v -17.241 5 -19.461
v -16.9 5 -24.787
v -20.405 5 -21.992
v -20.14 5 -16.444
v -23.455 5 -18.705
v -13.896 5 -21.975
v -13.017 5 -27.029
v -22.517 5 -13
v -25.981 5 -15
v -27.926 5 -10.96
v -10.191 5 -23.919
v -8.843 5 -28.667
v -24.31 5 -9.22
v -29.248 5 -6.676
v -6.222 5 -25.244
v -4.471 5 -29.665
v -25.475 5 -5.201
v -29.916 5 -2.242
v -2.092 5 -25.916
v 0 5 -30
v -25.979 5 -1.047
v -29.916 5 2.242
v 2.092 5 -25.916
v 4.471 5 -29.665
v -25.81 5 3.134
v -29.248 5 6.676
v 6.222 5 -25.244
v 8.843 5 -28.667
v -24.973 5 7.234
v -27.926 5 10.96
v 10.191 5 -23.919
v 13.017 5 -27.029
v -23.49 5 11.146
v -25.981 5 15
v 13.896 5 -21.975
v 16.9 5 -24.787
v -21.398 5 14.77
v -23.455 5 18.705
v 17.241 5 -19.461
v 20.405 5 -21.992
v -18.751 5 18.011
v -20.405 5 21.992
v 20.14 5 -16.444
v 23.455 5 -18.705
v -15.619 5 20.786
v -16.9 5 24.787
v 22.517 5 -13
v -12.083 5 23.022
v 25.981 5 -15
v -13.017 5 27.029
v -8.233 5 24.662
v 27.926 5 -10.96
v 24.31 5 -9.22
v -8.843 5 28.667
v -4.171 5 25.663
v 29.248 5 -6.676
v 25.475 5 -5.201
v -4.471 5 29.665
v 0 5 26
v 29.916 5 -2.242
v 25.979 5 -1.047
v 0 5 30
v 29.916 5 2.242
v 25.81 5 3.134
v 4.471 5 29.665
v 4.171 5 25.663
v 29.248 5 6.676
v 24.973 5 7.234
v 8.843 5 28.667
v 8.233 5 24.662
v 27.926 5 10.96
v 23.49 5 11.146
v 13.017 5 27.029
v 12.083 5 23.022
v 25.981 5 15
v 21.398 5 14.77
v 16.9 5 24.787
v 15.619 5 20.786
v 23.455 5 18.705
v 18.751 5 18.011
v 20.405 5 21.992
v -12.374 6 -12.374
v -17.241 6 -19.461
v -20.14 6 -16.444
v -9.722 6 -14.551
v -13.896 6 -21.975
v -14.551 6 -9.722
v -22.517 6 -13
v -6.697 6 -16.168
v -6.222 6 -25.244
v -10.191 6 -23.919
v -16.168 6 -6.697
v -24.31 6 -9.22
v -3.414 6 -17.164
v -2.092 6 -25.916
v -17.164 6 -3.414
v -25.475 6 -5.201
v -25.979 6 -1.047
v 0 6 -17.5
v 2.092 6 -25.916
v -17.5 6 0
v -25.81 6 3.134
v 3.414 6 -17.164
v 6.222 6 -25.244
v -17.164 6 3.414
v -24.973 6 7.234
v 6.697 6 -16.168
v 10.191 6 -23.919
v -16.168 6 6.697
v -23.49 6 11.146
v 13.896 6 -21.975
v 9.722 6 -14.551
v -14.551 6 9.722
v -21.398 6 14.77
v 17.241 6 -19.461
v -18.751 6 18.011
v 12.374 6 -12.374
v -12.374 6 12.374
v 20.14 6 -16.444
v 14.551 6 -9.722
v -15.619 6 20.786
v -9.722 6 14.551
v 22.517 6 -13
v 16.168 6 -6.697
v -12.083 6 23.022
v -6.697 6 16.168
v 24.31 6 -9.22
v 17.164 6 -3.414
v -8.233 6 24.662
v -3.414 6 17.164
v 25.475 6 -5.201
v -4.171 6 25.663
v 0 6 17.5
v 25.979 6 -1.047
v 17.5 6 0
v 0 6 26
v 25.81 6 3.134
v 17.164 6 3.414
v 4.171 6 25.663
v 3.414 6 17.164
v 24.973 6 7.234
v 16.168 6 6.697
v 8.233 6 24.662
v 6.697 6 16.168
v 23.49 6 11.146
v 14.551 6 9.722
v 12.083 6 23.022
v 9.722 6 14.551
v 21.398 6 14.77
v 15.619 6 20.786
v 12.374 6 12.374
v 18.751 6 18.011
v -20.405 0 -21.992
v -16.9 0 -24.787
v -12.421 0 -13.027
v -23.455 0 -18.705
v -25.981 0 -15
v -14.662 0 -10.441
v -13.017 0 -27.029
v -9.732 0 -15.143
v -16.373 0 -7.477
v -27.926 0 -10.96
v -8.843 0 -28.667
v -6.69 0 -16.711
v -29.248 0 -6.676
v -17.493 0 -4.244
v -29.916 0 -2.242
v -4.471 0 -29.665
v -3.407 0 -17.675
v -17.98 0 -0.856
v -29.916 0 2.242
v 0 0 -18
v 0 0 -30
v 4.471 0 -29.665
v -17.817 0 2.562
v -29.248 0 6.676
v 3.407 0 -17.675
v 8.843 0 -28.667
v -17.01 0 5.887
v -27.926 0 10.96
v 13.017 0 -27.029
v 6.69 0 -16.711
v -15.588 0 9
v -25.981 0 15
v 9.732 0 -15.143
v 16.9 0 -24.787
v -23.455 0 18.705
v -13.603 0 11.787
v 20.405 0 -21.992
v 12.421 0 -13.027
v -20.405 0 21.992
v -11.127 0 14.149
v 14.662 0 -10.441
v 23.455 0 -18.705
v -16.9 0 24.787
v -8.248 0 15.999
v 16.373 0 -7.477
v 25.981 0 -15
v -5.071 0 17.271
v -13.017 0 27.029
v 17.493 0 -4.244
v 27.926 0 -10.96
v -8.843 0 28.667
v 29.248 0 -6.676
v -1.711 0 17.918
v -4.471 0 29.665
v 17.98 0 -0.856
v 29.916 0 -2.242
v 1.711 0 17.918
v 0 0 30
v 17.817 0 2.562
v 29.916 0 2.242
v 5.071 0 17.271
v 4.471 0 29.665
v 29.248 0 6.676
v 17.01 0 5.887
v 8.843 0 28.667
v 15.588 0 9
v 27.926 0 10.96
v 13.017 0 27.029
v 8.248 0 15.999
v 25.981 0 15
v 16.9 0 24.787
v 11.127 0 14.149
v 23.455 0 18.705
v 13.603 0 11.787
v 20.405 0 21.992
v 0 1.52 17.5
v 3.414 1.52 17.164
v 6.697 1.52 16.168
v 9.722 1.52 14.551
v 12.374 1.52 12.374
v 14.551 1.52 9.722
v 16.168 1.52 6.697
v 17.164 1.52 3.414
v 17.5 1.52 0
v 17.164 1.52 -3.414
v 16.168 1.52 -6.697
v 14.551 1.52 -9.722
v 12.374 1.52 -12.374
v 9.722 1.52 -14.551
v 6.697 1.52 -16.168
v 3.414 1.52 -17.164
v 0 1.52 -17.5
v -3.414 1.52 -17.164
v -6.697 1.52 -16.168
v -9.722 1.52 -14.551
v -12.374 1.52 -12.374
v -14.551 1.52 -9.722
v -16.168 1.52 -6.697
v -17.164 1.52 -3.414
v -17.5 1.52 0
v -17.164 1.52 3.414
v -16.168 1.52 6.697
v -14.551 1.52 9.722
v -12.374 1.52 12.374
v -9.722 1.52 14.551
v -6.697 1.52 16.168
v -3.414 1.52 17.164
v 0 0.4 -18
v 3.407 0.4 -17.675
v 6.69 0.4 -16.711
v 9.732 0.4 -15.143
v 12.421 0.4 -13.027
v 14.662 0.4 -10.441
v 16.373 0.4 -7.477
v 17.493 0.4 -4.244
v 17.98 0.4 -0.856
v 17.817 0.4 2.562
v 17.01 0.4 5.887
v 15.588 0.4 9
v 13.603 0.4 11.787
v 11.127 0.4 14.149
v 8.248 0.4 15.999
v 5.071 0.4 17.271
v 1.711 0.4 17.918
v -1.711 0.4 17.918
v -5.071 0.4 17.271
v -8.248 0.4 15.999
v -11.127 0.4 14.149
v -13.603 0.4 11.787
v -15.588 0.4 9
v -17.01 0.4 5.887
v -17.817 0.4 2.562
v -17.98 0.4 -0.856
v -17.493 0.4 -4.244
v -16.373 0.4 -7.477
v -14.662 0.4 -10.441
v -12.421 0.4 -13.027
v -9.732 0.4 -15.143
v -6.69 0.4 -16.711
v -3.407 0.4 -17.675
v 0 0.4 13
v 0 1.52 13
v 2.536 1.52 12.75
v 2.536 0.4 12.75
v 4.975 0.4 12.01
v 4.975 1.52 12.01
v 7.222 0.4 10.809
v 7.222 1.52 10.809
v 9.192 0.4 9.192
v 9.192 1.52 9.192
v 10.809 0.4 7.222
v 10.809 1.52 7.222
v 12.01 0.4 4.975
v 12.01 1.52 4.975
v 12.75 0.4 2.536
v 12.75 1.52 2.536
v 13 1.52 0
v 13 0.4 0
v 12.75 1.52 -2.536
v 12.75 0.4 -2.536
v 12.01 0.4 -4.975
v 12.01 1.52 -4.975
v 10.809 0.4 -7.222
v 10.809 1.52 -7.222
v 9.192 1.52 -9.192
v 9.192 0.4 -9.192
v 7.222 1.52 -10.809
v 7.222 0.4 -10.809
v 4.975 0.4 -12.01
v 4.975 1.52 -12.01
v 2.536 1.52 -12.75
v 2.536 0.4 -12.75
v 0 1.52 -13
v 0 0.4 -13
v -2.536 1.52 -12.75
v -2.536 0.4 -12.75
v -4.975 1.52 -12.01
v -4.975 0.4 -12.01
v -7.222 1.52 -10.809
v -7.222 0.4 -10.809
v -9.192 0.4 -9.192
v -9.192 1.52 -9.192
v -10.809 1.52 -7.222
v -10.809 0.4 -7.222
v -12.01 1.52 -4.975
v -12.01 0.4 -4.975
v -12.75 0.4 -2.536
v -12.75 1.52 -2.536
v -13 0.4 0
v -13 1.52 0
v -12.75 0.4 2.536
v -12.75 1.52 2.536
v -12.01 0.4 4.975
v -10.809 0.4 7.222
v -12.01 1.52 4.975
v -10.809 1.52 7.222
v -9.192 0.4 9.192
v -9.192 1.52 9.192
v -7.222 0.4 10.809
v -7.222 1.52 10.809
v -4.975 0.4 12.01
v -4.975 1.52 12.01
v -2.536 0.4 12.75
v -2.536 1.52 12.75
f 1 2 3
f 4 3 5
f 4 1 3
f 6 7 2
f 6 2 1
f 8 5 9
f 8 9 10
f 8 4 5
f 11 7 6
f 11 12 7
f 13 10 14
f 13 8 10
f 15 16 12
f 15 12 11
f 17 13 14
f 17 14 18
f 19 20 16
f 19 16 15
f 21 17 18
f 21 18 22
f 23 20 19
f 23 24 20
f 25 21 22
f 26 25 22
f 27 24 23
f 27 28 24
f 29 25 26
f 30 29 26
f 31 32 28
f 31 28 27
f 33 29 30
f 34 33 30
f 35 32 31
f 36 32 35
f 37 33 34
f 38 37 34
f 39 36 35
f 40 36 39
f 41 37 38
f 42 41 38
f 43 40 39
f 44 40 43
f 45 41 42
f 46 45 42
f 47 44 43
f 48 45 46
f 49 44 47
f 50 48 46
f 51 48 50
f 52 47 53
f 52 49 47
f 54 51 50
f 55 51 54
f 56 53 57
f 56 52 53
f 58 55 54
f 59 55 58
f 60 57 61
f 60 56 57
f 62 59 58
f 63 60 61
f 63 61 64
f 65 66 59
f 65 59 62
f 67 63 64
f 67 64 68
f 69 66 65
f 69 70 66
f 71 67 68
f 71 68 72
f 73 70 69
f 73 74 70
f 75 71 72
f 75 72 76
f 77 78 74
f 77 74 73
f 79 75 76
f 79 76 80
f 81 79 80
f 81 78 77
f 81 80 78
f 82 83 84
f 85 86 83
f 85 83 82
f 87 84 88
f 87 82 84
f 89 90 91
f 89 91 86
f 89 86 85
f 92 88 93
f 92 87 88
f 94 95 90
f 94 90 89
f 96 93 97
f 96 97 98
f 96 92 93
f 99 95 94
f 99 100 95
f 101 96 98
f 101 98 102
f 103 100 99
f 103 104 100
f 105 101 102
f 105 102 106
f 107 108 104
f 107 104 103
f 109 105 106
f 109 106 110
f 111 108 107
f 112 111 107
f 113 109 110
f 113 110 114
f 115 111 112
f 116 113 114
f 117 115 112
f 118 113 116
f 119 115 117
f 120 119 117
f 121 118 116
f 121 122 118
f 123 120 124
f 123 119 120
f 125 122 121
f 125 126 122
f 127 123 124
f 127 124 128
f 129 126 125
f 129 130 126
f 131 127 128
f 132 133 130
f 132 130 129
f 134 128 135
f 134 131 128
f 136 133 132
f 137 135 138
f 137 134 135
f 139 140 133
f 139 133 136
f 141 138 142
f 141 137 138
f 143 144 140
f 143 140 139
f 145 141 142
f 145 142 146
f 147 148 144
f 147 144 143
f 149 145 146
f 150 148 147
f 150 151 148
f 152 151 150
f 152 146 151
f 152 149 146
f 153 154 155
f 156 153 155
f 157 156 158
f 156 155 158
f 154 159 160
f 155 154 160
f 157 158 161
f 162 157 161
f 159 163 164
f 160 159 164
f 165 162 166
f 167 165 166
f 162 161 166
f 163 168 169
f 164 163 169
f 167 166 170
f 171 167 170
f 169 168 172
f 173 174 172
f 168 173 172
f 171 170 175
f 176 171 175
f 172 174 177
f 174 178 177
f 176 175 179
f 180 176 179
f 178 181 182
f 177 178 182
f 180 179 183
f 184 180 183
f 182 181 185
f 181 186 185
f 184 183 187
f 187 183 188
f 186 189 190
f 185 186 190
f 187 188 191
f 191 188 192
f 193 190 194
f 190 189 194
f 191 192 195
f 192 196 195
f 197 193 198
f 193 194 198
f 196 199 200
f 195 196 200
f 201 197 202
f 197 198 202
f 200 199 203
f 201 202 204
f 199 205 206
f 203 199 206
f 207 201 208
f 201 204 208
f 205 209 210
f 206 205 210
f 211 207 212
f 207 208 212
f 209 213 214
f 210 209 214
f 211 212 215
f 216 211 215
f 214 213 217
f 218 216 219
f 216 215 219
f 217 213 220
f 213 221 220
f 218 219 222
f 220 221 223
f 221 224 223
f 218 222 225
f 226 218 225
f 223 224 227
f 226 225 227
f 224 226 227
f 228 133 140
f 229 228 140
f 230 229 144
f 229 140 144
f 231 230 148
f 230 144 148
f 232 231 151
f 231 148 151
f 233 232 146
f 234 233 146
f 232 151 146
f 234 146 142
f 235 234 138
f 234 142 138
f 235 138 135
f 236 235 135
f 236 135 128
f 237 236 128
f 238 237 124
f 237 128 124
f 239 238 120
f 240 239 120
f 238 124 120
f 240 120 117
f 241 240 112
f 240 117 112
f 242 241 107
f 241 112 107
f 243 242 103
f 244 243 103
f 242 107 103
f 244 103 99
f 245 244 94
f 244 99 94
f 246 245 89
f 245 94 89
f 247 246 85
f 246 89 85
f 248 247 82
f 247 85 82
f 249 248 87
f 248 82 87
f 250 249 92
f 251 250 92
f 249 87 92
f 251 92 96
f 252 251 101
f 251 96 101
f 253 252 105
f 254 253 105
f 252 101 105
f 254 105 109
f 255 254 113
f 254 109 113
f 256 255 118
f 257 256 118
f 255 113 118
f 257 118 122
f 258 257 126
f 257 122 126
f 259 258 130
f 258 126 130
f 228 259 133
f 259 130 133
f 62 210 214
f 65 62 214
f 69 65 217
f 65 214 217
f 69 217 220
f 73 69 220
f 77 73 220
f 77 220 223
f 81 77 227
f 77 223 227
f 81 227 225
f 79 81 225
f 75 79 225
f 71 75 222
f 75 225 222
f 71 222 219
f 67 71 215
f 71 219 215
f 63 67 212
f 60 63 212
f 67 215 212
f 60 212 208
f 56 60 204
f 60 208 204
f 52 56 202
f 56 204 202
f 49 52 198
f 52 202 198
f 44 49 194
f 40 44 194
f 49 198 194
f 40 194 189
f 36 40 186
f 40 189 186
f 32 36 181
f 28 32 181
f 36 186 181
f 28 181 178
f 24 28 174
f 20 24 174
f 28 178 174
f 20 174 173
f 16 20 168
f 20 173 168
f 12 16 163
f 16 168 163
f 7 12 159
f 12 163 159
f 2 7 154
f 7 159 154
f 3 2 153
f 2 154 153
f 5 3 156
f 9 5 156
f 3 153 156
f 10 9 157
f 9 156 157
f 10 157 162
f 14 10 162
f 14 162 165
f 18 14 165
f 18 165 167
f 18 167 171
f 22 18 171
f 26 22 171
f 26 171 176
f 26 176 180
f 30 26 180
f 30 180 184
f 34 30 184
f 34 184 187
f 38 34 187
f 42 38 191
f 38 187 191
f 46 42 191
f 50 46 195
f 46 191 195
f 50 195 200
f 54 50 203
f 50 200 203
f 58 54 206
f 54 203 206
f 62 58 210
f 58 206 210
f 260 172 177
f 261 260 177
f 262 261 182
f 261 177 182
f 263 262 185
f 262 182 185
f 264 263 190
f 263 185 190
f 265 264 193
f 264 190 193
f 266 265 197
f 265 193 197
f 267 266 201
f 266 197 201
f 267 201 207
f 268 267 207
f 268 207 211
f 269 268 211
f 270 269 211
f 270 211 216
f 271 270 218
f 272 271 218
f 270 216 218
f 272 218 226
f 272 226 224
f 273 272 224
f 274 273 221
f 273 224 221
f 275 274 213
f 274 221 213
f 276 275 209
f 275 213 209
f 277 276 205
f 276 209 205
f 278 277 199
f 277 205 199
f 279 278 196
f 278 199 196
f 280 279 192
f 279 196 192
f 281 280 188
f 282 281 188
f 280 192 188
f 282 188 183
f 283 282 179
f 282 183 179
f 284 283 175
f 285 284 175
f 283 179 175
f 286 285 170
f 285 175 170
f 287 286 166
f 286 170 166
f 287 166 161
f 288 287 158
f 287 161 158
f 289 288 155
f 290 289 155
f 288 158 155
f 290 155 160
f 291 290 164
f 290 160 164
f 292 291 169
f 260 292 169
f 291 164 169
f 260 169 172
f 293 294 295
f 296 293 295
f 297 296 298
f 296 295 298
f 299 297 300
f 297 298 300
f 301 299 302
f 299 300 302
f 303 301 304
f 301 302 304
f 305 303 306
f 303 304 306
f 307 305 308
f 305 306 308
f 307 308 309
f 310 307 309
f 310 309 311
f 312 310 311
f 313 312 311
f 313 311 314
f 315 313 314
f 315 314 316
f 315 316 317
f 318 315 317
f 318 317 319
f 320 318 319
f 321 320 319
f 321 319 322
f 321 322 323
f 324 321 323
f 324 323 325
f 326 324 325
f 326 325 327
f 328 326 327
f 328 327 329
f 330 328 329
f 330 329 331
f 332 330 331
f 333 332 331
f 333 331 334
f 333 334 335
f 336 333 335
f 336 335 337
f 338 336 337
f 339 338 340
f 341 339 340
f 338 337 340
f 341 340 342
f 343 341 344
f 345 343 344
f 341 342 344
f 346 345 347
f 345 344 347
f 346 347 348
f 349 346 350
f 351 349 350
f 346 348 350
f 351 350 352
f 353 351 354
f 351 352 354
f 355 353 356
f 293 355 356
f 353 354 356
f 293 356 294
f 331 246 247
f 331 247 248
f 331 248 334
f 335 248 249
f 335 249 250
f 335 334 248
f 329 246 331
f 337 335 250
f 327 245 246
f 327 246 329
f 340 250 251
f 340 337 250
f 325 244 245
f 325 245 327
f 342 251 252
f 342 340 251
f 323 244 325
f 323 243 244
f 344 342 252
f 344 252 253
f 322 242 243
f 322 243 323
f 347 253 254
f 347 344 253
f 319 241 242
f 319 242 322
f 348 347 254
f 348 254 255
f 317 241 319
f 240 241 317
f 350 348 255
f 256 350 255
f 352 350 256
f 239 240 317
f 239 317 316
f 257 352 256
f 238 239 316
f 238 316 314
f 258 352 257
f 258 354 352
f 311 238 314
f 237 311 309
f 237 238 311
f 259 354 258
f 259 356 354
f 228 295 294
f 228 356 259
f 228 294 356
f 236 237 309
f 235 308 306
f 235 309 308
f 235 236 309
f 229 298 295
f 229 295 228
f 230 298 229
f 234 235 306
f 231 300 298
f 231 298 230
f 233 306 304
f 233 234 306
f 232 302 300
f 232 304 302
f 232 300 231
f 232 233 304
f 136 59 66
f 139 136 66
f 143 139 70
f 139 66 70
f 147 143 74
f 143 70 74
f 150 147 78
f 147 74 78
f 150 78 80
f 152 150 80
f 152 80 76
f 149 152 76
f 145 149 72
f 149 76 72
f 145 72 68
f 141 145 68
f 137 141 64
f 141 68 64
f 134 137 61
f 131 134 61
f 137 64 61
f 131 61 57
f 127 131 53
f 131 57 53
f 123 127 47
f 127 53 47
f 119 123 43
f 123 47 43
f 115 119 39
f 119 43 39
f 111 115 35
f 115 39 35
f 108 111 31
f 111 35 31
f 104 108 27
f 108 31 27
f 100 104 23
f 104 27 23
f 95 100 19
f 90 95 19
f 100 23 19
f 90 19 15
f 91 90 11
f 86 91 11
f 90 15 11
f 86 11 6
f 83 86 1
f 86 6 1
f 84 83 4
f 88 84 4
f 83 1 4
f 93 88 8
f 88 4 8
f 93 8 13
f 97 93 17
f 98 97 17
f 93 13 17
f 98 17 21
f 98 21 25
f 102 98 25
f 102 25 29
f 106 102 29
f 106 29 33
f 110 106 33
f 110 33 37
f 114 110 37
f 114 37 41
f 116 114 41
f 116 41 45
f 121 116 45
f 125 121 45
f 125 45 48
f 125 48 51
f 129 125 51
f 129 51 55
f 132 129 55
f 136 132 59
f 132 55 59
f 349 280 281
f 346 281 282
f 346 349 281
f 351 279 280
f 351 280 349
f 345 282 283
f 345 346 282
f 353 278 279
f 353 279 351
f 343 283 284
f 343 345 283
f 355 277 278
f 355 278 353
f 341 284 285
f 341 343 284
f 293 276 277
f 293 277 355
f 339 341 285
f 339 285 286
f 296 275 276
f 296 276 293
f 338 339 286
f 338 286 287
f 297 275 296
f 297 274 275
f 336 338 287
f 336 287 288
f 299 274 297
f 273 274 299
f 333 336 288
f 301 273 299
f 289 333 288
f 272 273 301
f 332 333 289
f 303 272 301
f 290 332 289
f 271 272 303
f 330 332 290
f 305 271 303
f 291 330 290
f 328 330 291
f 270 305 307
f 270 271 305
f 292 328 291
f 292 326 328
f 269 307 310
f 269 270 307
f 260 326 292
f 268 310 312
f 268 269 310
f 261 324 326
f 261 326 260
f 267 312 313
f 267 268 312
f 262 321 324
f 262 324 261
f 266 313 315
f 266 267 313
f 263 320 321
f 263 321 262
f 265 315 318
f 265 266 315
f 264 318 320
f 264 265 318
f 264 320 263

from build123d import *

# Parameters (mm, degrees)
SKETCH_1_R          = 30
EXTRUDE_1_DEPTH     = 5
SKETCH_2_R          = 26
EXTRUDE_2_DEPTH     = 1
SKETCH_3_R          = 18
CUT_EXTRUDE_1_DEPTH = 0.4
SKETCH_4_R          = 17.5
CUT_EXTRUDE_2_DEPTH = 4.48
SKETCH_5_R          = 13
CUT_EXTRUDE_3_DEPTH = 43.662283108


with BuildPart() as part:
    # 草图1 → 凸台-拉伸1 (new body)
    with BuildSketch(Plane(origin=(0, 0, 0), x_dir=(1, 0, 0), z_dir=(0, 1, 0))):
        with Locations(Location((0, 0, 0), (0, 0, 270))):
            Circle(SKETCH_1_R)
    extrude(amount=EXTRUDE_1_DEPTH)

    # 草图2 → 凸台-拉伸2 (add)
    with BuildSketch(Plane(origin=(0, 5, 0), x_dir=(1, 0, 0), z_dir=(0, 1, 0))):
        with Locations(Location((0, 0, 0), (0, 0, 270))):
            Circle(SKETCH_2_R)
    extrude(amount=EXTRUDE_2_DEPTH)

    # 草图3 → 切除-拉伸1 (cut)
    with BuildSketch(Plane.XZ):
        with Locations(Location((0, 0, 0), (0, 0, 270))):
            Circle(SKETCH_3_R)
    extrude(amount=-CUT_EXTRUDE_1_DEPTH, mode=Mode.SUBTRACT)

    # 草图4 → 切除-拉伸2 (cut)
    with BuildSketch(Plane(origin=(0, 6, 0), x_dir=(1, 0, 0), z_dir=(0, 1, 0))):
        with Locations(Location((0, 0, 0), (0, 0, 270))):
            Circle(SKETCH_4_R)
    extrude(amount=-CUT_EXTRUDE_2_DEPTH, mode=Mode.SUBTRACT)

    # 草图5 → 切除-拉伸3 (cut, through all)
    with BuildSketch(Plane(origin=(0, 1.52, 0), x_dir=(1, 0, 0), z_dir=(0, 1, 0))):
        with Locations(Location((0, 0, 0), (0, 0, 270))):
            Circle(SKETCH_5_R)
    extrude(amount=-CUT_EXTRUDE_3_DEPTH, mode=Mode.SUBTRACT)


solid = part.part
